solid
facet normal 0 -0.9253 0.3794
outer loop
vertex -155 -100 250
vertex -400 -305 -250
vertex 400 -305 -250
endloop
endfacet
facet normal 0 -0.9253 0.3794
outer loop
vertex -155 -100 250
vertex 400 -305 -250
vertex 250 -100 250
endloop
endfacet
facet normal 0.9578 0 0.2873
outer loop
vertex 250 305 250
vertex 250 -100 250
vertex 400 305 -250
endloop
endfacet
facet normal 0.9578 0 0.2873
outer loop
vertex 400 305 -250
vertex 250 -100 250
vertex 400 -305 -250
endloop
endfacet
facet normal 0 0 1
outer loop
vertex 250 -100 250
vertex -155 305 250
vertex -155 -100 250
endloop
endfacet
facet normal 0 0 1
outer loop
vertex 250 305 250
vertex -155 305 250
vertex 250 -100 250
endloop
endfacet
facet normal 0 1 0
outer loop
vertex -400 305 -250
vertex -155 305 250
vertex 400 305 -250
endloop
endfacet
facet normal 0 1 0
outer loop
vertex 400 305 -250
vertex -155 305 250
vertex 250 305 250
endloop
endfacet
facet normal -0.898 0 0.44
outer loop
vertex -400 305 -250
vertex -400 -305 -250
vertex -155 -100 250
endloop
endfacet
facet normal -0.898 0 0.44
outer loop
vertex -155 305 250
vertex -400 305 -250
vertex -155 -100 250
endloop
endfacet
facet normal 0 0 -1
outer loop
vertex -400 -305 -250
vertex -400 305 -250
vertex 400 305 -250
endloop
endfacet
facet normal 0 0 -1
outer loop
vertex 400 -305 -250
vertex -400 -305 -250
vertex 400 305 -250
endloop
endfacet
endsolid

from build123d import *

# Parameters (mm, degrees)
F0_W     = 800
F0_H     = 610
F1_DEPTH = 250
F3_DEPTH = 610.001
F6_DEPTH = 800.001


with BuildPart() as f1:
    # F0 (on Top) → F1 (new body, symmetric)
    with BuildSketch(Plane.XY):
        Rectangle(F0_W, F0_H)
    extrude(amount=F1_DEPTH, both=True)

    # F2 (on face) → F3 (cut, through all)
    with BuildSketch(Plane.XZ.offset(305)):
        Polygon((-155, 250), (-400, 250), (-400, -250), align=None)
        Polygon((400, 250), (250, 250), (400, -250), align=None)
    extrude(amount=-F3_DEPTH, mode=Mode.SUBTRACT)

    # F5 (on offset) → F6 (cut, through all)
    with BuildSketch(Plane.YZ.offset(-400)):
        Polygon((-305, -250), (-100, 250), (-305, 250), align=None)
    extrude(amount=F6_DEPTH, mode=Mode.SUBTRACT)


solid = f1.part
